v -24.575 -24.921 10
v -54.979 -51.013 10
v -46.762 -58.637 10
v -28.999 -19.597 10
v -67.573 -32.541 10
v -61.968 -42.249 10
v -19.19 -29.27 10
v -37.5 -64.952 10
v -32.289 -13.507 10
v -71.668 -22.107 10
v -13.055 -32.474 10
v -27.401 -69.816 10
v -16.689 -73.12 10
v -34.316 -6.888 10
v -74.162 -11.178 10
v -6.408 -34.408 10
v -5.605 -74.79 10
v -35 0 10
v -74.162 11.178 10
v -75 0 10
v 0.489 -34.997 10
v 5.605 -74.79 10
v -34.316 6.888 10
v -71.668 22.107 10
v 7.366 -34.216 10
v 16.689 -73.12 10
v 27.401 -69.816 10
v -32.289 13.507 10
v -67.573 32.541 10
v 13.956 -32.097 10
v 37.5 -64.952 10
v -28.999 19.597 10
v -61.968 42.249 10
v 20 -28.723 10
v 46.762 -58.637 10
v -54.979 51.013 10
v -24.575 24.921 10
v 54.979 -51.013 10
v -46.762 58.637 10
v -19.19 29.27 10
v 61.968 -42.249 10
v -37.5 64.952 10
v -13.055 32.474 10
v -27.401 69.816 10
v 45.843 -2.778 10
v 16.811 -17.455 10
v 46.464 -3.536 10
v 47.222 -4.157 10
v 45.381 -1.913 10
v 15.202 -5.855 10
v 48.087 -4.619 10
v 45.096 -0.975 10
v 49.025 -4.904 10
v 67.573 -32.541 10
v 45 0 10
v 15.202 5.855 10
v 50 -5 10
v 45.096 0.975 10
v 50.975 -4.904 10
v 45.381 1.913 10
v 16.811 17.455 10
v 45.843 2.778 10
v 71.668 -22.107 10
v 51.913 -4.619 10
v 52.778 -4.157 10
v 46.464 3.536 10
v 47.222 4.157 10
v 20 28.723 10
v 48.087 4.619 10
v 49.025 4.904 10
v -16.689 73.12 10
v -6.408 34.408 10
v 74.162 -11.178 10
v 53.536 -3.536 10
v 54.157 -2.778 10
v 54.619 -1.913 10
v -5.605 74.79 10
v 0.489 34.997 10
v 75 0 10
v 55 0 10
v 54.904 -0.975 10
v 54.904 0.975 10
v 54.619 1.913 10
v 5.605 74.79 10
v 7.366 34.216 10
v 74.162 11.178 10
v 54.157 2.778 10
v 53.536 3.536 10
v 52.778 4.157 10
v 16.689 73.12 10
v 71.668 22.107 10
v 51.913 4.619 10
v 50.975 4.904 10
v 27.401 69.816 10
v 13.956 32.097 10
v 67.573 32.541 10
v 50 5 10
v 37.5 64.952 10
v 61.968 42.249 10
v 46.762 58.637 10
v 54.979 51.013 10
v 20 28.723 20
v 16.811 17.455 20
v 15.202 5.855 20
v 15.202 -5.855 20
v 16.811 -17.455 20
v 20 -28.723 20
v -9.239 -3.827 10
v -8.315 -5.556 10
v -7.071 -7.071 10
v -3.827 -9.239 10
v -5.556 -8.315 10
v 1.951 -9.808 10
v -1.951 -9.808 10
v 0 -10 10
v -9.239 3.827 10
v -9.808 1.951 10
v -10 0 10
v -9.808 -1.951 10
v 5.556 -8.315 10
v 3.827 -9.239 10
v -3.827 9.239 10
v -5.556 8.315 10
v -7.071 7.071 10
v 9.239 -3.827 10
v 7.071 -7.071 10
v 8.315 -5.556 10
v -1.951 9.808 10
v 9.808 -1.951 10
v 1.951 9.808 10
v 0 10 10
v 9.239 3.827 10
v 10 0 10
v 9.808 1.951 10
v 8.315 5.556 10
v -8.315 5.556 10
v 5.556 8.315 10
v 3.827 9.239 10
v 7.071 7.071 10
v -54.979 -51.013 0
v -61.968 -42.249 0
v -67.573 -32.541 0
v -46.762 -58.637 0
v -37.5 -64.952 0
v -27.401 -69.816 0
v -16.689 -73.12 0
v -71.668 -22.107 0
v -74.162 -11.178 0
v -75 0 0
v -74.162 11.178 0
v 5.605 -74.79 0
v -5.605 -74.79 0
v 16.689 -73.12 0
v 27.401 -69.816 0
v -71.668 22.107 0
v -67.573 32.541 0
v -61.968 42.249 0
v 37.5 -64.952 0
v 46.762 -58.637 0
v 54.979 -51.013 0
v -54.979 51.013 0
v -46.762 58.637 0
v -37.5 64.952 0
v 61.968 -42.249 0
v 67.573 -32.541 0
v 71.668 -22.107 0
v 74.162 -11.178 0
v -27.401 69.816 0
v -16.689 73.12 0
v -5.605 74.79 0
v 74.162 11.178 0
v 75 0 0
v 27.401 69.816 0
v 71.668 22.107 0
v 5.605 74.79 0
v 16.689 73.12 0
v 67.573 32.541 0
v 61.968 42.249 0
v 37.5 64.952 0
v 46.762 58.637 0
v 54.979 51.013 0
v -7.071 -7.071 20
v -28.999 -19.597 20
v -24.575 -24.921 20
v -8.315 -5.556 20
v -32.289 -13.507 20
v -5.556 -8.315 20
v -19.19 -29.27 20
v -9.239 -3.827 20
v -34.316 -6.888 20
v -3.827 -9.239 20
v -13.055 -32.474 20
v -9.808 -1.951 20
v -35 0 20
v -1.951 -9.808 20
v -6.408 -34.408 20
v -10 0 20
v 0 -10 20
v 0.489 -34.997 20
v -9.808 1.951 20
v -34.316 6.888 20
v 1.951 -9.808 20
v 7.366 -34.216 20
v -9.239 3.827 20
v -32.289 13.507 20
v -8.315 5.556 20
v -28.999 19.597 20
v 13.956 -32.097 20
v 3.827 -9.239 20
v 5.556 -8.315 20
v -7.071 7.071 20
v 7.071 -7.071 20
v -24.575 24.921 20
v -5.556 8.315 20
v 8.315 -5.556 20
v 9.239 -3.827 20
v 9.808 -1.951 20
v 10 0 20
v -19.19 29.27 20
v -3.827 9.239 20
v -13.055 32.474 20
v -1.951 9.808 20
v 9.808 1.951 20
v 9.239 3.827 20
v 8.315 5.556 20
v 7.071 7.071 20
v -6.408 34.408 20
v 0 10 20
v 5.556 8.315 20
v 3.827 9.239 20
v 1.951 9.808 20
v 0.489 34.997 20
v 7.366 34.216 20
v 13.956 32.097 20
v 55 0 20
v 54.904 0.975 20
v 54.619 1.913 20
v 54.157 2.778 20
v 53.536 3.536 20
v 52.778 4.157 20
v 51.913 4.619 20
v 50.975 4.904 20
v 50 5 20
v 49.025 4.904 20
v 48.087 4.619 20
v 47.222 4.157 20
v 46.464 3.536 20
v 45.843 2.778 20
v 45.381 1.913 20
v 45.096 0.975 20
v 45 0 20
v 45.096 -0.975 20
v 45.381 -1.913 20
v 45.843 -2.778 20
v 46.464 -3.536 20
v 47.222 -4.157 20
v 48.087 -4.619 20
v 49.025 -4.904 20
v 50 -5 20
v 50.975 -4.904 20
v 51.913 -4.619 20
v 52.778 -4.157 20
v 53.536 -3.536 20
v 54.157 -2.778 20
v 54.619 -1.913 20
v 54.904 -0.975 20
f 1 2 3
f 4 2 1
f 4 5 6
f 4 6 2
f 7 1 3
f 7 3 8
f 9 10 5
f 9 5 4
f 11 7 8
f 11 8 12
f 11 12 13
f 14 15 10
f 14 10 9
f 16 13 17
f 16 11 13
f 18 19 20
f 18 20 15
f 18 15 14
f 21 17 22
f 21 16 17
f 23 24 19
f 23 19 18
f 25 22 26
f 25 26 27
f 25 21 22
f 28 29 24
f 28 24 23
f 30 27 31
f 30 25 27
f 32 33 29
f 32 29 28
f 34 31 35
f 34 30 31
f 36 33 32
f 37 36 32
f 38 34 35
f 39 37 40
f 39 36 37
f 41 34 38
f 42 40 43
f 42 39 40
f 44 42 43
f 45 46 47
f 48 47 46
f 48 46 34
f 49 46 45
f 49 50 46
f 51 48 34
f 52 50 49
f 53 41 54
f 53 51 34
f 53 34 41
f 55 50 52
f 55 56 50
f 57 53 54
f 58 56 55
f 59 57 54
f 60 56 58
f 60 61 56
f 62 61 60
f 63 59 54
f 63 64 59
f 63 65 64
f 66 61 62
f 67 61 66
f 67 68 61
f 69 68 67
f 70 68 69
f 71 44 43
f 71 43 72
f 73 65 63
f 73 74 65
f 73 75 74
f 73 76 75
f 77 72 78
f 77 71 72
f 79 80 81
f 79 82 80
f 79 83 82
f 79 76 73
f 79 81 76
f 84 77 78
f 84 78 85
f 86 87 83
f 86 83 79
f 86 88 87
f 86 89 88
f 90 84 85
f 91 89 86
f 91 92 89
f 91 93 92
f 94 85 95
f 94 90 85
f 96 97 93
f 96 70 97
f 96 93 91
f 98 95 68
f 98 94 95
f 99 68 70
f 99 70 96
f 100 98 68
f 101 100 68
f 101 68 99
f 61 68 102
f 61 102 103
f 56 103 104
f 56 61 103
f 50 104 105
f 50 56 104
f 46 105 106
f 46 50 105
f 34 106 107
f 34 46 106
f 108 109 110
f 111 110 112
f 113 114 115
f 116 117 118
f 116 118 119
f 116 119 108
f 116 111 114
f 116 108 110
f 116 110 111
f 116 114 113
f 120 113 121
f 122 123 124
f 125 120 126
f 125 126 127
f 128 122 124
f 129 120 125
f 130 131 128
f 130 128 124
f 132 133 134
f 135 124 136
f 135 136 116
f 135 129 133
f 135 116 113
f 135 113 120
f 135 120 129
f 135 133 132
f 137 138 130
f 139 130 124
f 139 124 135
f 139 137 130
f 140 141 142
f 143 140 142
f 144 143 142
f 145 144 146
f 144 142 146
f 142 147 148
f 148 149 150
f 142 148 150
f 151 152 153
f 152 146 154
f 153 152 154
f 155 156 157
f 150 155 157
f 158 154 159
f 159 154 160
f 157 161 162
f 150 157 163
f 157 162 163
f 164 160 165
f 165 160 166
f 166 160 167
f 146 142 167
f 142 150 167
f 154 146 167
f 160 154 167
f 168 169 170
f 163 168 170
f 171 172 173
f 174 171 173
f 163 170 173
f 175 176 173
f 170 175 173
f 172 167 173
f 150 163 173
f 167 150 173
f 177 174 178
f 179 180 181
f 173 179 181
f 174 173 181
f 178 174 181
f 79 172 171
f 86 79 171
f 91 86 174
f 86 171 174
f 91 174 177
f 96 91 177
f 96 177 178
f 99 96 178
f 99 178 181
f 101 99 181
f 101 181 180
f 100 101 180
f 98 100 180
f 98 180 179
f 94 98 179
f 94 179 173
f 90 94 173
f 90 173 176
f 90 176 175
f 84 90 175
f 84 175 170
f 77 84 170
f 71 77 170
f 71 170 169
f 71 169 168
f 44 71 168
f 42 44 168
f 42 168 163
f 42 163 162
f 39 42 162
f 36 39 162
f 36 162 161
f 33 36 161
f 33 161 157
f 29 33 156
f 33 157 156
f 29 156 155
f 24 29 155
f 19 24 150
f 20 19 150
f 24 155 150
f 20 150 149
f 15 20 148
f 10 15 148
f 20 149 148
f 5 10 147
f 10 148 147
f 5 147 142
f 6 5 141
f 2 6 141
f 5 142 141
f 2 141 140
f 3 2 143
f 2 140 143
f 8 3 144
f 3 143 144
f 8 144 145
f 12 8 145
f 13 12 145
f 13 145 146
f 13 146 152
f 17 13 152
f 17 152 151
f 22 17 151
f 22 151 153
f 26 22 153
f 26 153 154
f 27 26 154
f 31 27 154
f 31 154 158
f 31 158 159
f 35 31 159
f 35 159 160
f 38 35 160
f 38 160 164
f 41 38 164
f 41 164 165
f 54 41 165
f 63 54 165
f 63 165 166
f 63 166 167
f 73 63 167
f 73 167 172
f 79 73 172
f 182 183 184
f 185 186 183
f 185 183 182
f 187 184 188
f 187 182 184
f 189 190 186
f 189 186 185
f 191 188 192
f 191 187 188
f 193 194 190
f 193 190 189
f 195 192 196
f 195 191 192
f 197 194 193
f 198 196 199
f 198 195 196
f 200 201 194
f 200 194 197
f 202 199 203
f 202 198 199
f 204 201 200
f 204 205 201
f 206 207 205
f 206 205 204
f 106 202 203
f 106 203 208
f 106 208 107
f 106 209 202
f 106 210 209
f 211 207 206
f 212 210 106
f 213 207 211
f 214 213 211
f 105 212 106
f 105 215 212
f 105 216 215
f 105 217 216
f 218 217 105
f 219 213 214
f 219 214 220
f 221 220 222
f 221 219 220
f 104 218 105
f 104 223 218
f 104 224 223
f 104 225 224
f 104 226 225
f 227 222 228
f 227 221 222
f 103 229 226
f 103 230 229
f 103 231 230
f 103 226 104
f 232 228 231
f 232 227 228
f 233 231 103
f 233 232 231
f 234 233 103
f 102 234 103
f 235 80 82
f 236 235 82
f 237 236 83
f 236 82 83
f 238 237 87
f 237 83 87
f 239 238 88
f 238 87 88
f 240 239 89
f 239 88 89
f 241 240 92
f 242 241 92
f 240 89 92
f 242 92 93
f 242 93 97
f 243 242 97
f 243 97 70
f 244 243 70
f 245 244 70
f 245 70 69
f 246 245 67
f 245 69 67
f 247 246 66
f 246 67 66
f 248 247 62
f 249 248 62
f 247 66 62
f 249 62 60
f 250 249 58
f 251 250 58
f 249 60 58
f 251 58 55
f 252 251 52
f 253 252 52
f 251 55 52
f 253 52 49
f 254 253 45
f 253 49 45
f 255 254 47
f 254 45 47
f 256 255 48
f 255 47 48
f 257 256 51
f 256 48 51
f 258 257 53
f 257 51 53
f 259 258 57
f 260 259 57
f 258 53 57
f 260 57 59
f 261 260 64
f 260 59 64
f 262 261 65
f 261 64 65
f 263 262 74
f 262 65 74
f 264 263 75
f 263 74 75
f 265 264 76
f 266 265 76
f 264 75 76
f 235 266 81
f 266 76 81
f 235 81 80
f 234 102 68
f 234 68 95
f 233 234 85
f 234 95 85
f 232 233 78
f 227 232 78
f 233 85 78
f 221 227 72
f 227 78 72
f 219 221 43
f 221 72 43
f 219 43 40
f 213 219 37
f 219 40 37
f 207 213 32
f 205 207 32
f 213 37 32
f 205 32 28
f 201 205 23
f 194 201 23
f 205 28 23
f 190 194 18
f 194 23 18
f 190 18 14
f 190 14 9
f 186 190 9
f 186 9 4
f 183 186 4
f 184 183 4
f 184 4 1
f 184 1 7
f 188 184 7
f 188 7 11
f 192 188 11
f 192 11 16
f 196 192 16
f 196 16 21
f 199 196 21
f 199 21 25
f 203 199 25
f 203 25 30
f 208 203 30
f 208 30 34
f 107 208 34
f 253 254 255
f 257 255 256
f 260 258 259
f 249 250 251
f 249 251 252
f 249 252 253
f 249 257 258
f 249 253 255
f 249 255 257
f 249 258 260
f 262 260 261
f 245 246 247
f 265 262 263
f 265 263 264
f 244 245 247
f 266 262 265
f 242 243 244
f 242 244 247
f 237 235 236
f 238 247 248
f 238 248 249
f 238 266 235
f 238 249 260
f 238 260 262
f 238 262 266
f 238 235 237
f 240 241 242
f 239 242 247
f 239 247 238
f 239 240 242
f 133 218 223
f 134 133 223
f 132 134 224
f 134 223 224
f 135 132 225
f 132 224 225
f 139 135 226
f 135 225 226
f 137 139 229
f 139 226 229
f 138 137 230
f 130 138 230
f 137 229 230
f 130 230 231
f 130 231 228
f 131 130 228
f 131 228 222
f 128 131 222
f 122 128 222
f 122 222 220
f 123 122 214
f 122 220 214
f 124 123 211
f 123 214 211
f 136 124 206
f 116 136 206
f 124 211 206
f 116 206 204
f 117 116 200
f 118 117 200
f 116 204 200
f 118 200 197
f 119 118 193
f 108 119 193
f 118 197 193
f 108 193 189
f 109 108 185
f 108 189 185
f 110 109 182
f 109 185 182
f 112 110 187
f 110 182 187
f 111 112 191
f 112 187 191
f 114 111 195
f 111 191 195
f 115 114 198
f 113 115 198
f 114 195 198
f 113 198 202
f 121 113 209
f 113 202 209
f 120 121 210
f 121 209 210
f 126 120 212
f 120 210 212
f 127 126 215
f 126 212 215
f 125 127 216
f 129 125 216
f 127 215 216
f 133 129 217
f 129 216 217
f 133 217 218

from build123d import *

# Parameters (mm, degrees)
CROQUIS1_R              = 75
SALIENTE_EXTRUIR1_DEPTH = 20
CROQUIS2_R              = 10
CORTAR_EXTRUIR1_DEPTH   = 10
CORTAR_EXTRUIR2_START   = -10
CROQUIS3_R              = 75
CROQUIS3_R_2            = 35
CORTAR_EXTRUIR2_DEPTH   = 10
CROQUIS4_R              = 5
SALIENTE_EXTRUIR3_DEPTH = 10
CORTAR_EXTRUIR3_START   = -10
CORTAR_EXTRUIR3_DEPTH   = 10


with BuildPart() as part:
    # Croquis1 → Saliente-Extruir1 (new body)
    with BuildSketch(Plane.XY):
        Circle(CROQUIS1_R)
    extrude(amount=SALIENTE_EXTRUIR1_DEPTH)

    # Croquis2 → Cortar-Extruir1 (cut)
    with BuildSketch(Plane.XY.offset(20)):
        Circle(CROQUIS2_R)
    extrude(amount=-CORTAR_EXTRUIR1_DEPTH, mode=Mode.SUBTRACT)

    # Croquis3 → Cortar-Extruir2 (cut)
    with BuildSketch(Plane.XY.offset(20).offset(CORTAR_EXTRUIR2_START)):
        Circle(CROQUIS3_R)
        Circle(CROQUIS3_R_2, mode=Mode.SUBTRACT)
    extrude(amount=CORTAR_EXTRUIR2_DEPTH, mode=Mode.SUBTRACT)

    # Croquis4 → Saliente-Extruir3 (add)
    with BuildSketch(Plane.XY.offset(10)):
        with Locations((50, 0)):
            Circle(CROQUIS4_R)
    extrude(amount=SALIENTE_EXTRUIR3_DEPTH)

    # Croquis5 → Cortar-Extruir3 (cut)
    with BuildSketch(Plane.XY.offset(20).offset(CORTAR_EXTRUIR3_START)):
        with BuildLine():
            ThreePointArc((20, 28.722813233), (15, 0), (20, -28.722813233))
            ThreePointArc((20, -28.722813233), (35, 0), (20, 28.722813233))
        make_face()
    extrude(amount=CORTAR_EXTRUIR3_DEPTH, mode=Mode.SUBTRACT)


solid = part.part
